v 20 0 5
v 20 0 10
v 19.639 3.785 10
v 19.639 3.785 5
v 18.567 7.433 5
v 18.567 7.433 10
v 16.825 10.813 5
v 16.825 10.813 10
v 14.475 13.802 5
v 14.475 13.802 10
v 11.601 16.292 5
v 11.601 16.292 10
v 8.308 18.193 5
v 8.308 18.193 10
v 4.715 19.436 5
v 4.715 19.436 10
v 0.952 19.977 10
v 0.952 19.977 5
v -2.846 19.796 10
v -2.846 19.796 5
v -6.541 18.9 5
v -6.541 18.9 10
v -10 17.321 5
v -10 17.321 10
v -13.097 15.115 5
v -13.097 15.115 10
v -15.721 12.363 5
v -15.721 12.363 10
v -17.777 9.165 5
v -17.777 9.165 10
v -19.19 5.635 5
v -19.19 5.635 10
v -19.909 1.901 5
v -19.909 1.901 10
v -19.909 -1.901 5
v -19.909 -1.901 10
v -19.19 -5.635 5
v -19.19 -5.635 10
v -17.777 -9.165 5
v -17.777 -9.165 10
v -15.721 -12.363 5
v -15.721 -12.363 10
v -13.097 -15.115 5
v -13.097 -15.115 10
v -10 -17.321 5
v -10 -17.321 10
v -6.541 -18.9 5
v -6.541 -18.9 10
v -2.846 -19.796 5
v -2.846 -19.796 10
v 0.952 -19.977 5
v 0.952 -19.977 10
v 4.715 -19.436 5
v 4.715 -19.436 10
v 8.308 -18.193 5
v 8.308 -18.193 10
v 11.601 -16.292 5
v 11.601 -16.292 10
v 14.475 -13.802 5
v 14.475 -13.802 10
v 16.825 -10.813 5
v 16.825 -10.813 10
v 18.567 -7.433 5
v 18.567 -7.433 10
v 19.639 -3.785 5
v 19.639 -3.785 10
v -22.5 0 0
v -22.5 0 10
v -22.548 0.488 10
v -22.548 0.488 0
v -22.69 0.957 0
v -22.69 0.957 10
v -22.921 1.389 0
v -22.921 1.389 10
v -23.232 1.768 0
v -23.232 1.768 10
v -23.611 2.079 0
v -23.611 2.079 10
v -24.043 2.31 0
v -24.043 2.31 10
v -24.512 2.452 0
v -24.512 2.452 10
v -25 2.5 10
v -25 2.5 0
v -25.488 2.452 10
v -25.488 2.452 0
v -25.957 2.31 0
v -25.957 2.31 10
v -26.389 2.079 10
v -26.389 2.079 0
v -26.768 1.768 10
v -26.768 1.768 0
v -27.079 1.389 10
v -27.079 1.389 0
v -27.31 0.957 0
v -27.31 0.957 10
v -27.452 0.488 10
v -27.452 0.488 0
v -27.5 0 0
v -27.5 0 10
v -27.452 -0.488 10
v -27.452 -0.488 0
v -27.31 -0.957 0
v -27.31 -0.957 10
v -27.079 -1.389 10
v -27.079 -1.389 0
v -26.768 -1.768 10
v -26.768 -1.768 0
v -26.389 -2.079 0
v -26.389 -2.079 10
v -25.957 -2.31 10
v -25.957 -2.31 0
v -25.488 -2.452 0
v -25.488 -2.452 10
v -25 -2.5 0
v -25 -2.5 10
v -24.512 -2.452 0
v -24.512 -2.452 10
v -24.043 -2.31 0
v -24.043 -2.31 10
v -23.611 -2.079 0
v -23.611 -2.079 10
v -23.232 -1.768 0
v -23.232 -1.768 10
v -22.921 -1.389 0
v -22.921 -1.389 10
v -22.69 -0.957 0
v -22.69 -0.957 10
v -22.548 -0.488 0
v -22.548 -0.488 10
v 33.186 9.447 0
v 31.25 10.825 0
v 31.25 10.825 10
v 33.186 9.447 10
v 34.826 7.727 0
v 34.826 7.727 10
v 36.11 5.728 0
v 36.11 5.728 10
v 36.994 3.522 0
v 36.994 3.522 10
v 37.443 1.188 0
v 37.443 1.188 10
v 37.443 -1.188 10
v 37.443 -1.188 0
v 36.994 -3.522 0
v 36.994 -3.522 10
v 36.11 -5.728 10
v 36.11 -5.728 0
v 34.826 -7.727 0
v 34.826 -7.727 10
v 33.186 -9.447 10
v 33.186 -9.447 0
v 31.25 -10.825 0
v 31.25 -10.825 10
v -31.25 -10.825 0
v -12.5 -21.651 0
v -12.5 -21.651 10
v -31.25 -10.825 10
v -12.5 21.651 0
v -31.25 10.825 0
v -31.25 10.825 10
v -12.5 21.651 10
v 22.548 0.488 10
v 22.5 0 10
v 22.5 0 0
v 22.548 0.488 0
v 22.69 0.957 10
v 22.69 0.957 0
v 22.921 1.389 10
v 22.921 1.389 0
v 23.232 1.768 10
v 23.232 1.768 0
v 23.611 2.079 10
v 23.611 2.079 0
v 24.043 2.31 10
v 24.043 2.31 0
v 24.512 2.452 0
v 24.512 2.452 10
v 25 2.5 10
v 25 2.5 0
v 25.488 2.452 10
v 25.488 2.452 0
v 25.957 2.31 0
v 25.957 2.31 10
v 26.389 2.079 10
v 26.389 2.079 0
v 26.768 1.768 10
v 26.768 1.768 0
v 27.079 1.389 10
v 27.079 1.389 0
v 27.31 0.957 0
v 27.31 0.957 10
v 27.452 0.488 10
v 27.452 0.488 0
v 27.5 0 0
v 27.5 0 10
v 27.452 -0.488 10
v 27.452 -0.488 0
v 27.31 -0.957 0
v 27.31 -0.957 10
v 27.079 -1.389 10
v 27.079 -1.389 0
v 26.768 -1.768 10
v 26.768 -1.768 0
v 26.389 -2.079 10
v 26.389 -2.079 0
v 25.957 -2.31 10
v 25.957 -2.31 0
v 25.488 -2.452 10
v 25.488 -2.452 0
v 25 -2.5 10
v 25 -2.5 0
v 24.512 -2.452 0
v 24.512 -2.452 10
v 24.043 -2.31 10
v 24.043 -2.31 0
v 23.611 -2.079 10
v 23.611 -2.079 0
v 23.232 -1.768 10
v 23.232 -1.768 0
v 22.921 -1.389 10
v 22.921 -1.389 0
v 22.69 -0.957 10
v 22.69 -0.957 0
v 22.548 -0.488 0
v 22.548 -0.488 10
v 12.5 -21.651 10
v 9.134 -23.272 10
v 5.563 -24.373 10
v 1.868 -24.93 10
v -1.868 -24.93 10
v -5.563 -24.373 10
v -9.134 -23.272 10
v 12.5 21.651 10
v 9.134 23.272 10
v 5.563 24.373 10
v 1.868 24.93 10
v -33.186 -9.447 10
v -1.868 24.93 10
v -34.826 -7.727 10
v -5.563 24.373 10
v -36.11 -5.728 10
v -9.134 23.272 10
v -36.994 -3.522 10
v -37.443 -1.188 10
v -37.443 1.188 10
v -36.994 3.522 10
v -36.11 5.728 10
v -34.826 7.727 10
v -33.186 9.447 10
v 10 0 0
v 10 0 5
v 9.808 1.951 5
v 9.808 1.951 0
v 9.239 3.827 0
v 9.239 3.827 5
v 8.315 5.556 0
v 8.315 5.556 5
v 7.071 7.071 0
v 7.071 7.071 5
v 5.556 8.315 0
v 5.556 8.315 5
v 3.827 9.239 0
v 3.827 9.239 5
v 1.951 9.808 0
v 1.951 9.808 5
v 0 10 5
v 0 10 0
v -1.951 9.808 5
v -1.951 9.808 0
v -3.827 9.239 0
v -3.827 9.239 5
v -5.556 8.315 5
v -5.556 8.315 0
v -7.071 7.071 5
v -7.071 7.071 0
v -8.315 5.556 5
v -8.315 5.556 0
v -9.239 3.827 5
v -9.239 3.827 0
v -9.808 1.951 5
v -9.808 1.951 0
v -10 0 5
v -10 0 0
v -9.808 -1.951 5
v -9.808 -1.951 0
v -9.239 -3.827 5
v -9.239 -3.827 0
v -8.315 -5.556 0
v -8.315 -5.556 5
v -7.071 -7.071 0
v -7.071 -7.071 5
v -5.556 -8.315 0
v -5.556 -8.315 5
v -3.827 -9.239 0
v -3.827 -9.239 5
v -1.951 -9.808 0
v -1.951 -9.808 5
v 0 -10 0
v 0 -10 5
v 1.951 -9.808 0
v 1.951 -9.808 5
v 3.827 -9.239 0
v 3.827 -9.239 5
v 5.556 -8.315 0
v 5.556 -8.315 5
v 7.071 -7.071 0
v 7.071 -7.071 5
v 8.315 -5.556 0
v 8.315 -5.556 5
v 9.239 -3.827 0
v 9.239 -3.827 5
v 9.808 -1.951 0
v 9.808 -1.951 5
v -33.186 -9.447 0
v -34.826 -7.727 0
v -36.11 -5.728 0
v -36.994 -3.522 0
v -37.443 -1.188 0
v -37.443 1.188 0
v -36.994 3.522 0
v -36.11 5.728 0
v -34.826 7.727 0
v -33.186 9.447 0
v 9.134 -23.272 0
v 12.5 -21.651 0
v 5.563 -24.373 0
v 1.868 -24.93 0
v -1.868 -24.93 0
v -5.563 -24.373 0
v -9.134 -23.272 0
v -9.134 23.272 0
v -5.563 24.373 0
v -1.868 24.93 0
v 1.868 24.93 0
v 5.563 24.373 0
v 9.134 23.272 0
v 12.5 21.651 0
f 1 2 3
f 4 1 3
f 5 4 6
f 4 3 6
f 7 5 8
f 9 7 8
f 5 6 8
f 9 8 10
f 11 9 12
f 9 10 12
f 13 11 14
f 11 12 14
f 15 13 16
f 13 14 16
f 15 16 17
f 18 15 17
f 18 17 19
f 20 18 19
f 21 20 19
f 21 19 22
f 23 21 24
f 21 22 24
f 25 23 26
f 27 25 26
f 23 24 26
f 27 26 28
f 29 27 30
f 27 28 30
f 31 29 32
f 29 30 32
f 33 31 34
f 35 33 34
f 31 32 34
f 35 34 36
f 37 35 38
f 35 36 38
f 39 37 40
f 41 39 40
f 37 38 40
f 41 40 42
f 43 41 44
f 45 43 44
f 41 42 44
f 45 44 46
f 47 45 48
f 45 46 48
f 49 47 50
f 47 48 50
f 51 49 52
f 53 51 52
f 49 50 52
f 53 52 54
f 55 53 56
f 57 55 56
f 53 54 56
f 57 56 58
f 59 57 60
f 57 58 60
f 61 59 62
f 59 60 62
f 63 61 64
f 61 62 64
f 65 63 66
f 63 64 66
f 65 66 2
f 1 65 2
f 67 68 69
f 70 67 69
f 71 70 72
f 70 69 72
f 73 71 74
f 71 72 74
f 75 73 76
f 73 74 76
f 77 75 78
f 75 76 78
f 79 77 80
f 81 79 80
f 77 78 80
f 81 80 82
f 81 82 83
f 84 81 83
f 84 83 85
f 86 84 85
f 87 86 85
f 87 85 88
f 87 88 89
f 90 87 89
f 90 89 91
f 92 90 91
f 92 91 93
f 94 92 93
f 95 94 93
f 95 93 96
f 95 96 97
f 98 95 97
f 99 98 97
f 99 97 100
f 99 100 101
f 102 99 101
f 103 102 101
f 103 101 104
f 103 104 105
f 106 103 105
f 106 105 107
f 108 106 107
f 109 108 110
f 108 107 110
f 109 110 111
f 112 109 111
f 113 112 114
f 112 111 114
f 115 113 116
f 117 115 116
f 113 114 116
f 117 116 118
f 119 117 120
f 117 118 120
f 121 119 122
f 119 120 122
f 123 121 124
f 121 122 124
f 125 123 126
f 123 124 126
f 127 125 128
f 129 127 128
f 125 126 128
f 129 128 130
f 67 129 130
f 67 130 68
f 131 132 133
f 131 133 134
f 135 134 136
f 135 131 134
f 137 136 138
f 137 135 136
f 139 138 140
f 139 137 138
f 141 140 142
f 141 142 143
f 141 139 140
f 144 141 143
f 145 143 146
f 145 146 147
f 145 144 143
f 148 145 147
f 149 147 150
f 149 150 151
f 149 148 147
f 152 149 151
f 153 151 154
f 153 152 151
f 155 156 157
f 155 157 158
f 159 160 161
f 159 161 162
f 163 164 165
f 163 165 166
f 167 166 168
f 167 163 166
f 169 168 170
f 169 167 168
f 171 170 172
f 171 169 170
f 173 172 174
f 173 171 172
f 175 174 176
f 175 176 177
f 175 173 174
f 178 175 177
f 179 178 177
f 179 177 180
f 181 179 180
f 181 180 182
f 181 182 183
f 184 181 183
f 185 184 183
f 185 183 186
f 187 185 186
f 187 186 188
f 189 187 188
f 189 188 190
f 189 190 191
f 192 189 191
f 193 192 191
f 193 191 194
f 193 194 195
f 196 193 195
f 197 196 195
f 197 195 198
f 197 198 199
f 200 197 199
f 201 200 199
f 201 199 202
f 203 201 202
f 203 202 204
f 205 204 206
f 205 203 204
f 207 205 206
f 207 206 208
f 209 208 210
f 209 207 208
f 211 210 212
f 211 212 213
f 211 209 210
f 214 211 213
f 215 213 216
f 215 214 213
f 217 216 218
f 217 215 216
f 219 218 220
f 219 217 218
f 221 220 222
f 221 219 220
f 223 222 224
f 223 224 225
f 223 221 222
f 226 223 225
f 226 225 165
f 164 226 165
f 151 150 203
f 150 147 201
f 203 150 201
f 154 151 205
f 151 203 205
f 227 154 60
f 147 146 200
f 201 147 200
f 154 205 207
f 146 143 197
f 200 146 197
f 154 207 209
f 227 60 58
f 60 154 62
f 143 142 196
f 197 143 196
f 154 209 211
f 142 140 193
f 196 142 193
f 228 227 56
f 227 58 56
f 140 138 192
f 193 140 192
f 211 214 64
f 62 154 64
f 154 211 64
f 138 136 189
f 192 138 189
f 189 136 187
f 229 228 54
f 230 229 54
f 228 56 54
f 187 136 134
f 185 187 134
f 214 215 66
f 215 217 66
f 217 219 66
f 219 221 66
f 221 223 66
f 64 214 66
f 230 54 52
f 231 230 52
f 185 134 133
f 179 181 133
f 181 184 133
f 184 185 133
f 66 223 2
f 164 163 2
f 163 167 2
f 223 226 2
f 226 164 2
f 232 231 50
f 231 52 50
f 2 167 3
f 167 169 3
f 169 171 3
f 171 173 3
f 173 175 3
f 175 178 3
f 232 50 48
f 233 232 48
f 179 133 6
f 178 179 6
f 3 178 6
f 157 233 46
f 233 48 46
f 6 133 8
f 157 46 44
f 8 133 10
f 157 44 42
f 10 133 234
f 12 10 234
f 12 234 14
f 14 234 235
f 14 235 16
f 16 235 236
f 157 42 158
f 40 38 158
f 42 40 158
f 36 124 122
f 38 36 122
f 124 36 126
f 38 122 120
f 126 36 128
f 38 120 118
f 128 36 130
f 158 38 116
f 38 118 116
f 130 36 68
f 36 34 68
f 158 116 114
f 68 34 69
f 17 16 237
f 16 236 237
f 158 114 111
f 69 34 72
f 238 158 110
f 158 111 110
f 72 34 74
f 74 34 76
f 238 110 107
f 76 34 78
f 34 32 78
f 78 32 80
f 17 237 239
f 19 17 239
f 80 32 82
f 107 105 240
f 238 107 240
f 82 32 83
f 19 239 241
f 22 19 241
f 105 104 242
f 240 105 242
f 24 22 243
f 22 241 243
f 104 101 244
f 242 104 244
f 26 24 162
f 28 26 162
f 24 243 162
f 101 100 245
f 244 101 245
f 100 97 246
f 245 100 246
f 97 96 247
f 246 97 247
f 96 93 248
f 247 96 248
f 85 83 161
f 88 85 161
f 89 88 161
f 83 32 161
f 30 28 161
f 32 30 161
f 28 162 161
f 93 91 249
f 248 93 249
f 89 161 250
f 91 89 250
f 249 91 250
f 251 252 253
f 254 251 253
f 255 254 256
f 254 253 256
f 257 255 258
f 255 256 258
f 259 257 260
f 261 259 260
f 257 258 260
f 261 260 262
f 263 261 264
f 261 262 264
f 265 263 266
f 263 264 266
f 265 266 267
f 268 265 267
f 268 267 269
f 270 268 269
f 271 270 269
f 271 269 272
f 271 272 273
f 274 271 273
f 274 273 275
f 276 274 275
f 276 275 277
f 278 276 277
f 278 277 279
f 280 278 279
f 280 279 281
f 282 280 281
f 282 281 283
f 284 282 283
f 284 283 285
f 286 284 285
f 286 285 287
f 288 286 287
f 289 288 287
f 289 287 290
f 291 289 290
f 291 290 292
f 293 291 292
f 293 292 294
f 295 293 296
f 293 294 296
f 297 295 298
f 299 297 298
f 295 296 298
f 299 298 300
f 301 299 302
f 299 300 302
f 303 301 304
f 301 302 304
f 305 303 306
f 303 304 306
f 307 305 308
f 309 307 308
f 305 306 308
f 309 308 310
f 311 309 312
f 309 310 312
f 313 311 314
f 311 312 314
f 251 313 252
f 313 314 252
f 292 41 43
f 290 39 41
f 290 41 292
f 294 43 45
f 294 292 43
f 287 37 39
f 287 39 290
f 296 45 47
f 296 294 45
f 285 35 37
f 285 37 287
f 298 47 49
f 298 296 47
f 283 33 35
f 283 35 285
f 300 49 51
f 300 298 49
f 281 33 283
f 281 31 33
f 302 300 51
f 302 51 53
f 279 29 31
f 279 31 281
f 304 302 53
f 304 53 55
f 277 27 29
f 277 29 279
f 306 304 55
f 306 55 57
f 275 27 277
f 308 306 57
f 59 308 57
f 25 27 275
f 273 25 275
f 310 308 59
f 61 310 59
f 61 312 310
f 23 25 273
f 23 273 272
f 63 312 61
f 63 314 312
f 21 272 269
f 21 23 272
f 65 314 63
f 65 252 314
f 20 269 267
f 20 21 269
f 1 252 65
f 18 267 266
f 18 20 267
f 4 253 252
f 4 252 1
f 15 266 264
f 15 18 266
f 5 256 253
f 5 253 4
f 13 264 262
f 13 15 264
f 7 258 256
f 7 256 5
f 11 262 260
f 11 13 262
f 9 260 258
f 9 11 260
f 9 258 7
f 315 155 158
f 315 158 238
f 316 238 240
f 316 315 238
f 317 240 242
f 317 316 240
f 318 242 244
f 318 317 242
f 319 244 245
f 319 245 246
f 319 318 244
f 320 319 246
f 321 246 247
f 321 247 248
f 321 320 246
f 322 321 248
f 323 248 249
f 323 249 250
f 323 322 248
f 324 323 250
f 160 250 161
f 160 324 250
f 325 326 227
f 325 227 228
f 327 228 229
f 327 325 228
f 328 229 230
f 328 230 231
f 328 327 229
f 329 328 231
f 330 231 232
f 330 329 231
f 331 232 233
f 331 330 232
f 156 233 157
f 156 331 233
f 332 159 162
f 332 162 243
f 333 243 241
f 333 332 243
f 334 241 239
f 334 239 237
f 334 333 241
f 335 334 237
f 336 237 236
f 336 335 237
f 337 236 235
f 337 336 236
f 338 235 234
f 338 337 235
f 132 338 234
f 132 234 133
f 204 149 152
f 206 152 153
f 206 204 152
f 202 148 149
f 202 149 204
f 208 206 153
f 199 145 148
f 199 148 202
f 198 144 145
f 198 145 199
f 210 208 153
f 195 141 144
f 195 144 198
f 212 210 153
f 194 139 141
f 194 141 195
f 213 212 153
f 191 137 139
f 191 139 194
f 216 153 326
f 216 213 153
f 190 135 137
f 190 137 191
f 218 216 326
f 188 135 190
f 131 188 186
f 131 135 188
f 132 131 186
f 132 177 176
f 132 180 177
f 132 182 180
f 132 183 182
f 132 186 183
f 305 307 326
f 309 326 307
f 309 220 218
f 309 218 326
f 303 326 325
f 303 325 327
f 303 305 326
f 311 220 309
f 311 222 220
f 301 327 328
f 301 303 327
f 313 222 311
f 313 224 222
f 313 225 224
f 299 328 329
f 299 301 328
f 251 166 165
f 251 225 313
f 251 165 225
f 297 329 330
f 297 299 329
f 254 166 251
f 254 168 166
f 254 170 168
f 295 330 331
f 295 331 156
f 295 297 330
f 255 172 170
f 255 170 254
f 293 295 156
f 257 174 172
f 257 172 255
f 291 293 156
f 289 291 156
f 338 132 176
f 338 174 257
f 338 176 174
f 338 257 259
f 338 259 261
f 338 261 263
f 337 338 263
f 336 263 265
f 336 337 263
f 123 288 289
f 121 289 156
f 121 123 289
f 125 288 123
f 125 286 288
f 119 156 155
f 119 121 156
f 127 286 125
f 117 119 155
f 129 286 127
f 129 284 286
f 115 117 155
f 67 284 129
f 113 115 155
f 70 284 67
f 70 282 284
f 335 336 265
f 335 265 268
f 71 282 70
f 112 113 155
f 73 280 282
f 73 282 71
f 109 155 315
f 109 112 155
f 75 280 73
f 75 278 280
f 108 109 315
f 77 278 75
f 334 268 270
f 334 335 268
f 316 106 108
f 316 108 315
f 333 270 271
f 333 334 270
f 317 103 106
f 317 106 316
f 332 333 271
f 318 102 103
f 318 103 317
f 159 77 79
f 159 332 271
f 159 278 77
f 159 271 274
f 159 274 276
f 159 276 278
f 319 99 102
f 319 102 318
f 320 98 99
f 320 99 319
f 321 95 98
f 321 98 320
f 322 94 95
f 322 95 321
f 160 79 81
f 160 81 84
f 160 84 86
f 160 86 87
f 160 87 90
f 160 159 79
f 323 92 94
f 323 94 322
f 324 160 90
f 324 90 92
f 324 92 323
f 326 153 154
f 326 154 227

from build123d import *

# Parameters (mm, degrees)
EXTRUDE_1_DEPTH     = 10
SKETCH_2_R          = 20
CUT_EXTRUDE_1_DEPTH = 5
CUT_EXTRUDE_2_REACH = 47.346
SKETCH_3_R          = 10
CUT_EXTRUDE_3_REACH = 48.165
SKETCH_4_R          = 2.5


with BuildPart() as part:
    # 草图1 → 凸台-拉伸1 (new body)
    with BuildSketch(Plane.XY):
        with BuildLine():
            Line((12.5, 21.650635095), (31.25, 10.825317547))
            ThreePointArc((31.25, 10.825317547), (37.5, 0), (31.25, -10.825317547))
            Line((31.25, -10.825317547), (12.5, -21.650635095))
            ThreePointArc((12.5, -21.650635095), (0, -25), (-12.5, -21.650635095))
            Line((-12.5, -21.650635095), (-31.25, -10.825317547))
            ThreePointArc((-31.25, -10.825317547), (-37.5, 0), (-31.25, 10.825317547))
            Line((-31.25, 10.825317547), (-12.5, 21.650635095))
            ThreePointArc((-12.5, 21.650635095), (0, 25), (12.5, 21.650635095))
        make_face()
    extrude(amount=EXTRUDE_1_DEPTH)

    # 草图2 → 切除-拉伸1 (cut)
    with BuildSketch(Plane.XY.offset(10)):
        Circle(SKETCH_2_R)
    extrude(amount=-CUT_EXTRUDE_1_DEPTH, mode=Mode.SUBTRACT)

    # 草图3 → 切除-拉伸2 (cut, up to next)
    with BuildSketch(Plane.XY.offset(5), mode=Mode.PRIVATE) as cut_extrude_2_sk1:
        Circle(SKETCH_3_R)
    cut_extrude_2_tool1 = extrude(cut_extrude_2_sk1.sketch, amount=-CUT_EXTRUDE_2_REACH, mode=Mode.PRIVATE) & part.part
    add(cut_extrude_2_tool1.solids().sort_by_distance((0, 0, 5))[0], mode=Mode.SUBTRACT)

    # 草图4 → 切除-拉伸3 (cut, up to next)
    with BuildSketch(Plane.XY.offset(10), mode=Mode.PRIVATE) as cut_extrude_3_sk1:
        with Locations((-25, 0)):
            Circle(SKETCH_4_R)
    cut_extrude_3_tool1 = extrude(cut_extrude_3_sk1.sketch, amount=-CUT_EXTRUDE_3_REACH, mode=Mode.PRIVATE) & part.part
    cut_extrude_3 = cut_extrude_3_tool1.solids().sort_by_distance((-25, 0, 10))[0]
    add(cut_extrude_3, mode=Mode.SUBTRACT)

    # 镜向1: 切除-拉伸3 across plane
    add(cut_extrude_3.mirror(Plane(origin=(0, 0, 0), x_dir=(0, 0, 1), z_dir=(1, 0, 0))), mode=Mode.SUBTRACT)


solid = part.part
